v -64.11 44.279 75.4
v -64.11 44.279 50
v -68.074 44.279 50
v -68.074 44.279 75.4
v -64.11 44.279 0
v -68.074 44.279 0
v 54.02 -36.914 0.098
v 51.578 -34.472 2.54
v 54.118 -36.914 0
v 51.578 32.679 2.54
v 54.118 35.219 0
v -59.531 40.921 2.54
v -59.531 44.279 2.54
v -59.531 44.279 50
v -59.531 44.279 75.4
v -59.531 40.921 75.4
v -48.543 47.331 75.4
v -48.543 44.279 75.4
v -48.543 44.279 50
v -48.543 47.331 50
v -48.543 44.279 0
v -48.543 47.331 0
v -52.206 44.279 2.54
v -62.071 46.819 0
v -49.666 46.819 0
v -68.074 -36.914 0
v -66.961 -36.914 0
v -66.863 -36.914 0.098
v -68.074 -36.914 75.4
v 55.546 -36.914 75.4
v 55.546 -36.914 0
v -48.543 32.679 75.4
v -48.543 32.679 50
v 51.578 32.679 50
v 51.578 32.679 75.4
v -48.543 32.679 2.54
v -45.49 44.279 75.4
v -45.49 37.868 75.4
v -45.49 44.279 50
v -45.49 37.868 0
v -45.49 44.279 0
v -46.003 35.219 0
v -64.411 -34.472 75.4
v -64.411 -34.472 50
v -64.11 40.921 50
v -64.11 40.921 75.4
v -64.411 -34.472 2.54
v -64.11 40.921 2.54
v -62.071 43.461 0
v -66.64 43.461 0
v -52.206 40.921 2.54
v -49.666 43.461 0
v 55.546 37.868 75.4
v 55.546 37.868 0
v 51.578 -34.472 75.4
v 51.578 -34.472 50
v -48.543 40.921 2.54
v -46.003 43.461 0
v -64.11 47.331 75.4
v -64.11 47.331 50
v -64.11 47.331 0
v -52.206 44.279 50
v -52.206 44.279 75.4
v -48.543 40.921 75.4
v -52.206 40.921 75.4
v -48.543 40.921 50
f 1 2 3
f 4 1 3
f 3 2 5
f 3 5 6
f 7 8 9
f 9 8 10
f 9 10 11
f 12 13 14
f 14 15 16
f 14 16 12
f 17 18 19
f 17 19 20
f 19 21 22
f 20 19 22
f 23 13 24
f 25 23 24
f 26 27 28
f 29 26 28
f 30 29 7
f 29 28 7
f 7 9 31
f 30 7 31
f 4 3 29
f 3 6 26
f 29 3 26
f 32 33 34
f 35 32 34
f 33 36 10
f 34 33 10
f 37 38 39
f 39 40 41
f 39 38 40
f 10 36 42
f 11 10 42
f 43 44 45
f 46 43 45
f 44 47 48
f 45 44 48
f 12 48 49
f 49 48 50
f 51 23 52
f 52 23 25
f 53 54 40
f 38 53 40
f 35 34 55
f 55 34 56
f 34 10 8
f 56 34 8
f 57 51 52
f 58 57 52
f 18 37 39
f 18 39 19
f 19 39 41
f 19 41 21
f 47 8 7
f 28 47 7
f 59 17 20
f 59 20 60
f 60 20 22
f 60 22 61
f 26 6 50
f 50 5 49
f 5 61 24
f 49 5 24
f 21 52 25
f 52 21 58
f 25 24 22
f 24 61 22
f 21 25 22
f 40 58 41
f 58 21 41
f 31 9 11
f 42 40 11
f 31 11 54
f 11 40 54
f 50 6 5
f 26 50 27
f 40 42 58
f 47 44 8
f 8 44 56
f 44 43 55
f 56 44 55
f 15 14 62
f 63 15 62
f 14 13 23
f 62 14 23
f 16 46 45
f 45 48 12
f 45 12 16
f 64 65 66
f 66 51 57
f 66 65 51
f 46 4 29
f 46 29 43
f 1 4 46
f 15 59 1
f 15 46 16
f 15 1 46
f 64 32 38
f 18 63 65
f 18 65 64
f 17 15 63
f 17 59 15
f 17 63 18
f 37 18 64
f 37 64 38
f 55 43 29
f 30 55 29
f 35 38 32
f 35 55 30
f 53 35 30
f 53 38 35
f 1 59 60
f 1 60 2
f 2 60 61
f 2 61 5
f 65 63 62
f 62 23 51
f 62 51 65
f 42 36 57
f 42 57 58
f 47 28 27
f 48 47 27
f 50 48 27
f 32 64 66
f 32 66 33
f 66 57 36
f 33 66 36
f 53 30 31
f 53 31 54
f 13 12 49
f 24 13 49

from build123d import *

# Parameters (mm, degrees)
F1_DEPTH      = 50
F2_DEPTH      = 25.4
F4_T1_DEPTH   = 7.325630635
F4_T3_DEPTH   = 9.8896528584
F4_T5_DEPTH   = 10.1948919696
F4_T7_DEPTH   = 14.7742944759
F4_T9_DEPTH   = 106.6527421576
F4_T11_DEPTH  = 67.1516433358
F4_T16_DEPTH  = 88.4586156969
F4_T22_DEPTH  = 17.6426691914
F4_T27_DEPTH  = 122.521271835
F4_T33_DEPTH  = 88.4586156969
F4_T38_DEPTH  = 122.521271835
F4_T47_DEPTH  = 88.4586156969
F4_T53_DEPTH  = 11.110594402
F4_T61_DEPTH  = 88.4586156969
F4_T66_DEPTH  = 11.110594402
F4_T74_DEPTH  = 13.8577054245
F4_T79_DEPTH  = 9.8896528584
F4_T87_DEPTH  = 9.8896528584
F4_T92_DEPTH  = 13.8577054245
F4_T100_DEPTH = 14.7742944759
F4_T105_DEPTH = 10.1948919696
F4_T113_DEPTH = 73.6837181253
F4_T118_DEPTH = 106.6527421576
F4_T126_DEPTH = 129.0533466244
F4_T132_DEPTH = 73.6837181253


# Not quite as in the source:
# - a fillet or chamfer that OpenCascade refuses, or shapes differently, is made with other operations: its cross-section is extruded or revolved along the edge and cut away or added
# - a feature of the source that left no trace in its solid (it failed there, or was rolled back) is left out


with BuildPart() as f1:
    # F0 (on Top) → F1 (new body)
    with BuildSketch(Plane.XY):
        Polygon((55.5458813906, -34.4724208117), (55.5458813906, 37.8682129085), (-45.4904846847, 37.8682129085), (-45.4904846847, 44.2790202796), (-48.5428348184, 44.2790202796), (-48.5428348184, 47.331366688), (-64.1098022461, 47.331366688), (-64.1098022461, 44.2790202796), (-68.0741816759, 44.2790202796), (-68.0741816759, 37.8682129085), (-68.0741816759, 32.6792225242), (-68.0741816759, -36.9142964482), (55.5458813906, -36.9142964482), align=None)
        Polygon((-48.5428348184, 32.6792225242), (51.5778325498, 32.6792225242), (51.5778325498, -34.4724208117), (-64.4113644958, -34.4724208117), (-64.1098022461, 40.9214422107), (-59.5312826335, 40.9214422107), (-59.5312826335, 44.2790202796), (-52.2056519985, 44.2790202796), (-52.2056519985, 40.9214422107), (-48.5428348184, 40.9214422107), align=None, mode=Mode.SUBTRACT)
    extrude(amount=F1_DEPTH)

    # F0 (on Top) + F1_face (on face) → F2 (join)
    with BuildSketch(Plane.XY):
        Polygon((55.5458813906, -34.4724208117), (55.5458813906, 37.8682129085), (-45.4904846847, 37.8682129085), (-45.4904846847, 44.2790202796), (-48.5428348184, 44.2790202796), (-48.5428348184, 47.331366688), (-64.1098022461, 47.331366688), (-64.1098022461, 44.2790202796), (-68.0741816759, 44.2790202796), (-68.0741816759, 37.8682129085), (-68.0741816759, 32.6792225242), (-68.0741816759, -36.9142964482), (55.5458813906, -36.9142964482), align=None)
        Polygon((-48.5428348184, 32.6792225242), (51.5778325498, 32.6792225242), (51.5778325498, -34.4724208117), (-64.4113644958, -34.4724208117), (-64.1098022461, 40.9214422107), (-59.5312826335, 40.9214422107), (-59.5312826335, 44.2790202796), (-52.2056519985, 44.2790202796), (-52.2056519985, 40.9214422107), (-48.5428348184, 40.9214422107), align=None, mode=Mode.SUBTRACT)
    with BuildSketch(Plane(origin=(-7.1792836418, 9.1982220042, 50), x_dir=(1, 0, 0), z_dir=(0, 0, 1))):
        Polygon((62.7251650324, -46.1125184524), (62.7251650324, 28.6699909043), (-38.3112010429, 28.6699909043), (-38.3112010429, 35.0807982755), (-41.3635511765, 35.0807982755), (-41.3635511765, 38.1331446838), (-56.9305186042, 38.1331446838), (-56.9305186042, 35.0807982755), (-60.8948980341, 35.0807982755), (-60.8948980341, -46.1125184524), align=None)
        Polygon((-56.9305186042, 31.7232202065), (-52.3519989917, 31.7232202065), (-52.3519989917, 35.0807982755), (-45.0263683567, 35.0807982755), (-45.0263683567, 31.7232202065), (-41.3635511765, 31.7232202065), (-41.3635511765, 23.48100052), (58.7571161917, 23.48100052), (58.7571161917, -43.6706428158), (-57.2320808539, -43.6706428158), align=None, mode=Mode.SUBTRACT)
    extrude(amount=F2_DEPTH)

    # F4: chamfer of 2.54 on 10 edges, made by hand

    # F4_s2 → F4_t1 (cut)
    with BuildSketch(Plane.YZ.offset(-59.5312826335)):
        Polygon((44.2790202796, 2.54), (46.8190202796, 0), (44.2790202796, 0), align=None)
    extrude(amount=F4_T1_DEPTH, mode=Mode.SUBTRACT)

    # F4_s4 → F4_t3 (cut)
    with BuildSketch(Plane.XZ.offset(-44.2790202796)):
        Polygon((-59.5312826335, 2.54), (-62.0712826335, 0), (-59.5312826335, 0), align=None)
        Polygon((-52.2056519985, 2.54), (-49.6656519985, 0), (-52.2056519985, 0), align=None)
    extrude(amount=F4_T3_DEPTH, mode=Mode.SUBTRACT)

    # F4_s6 → F4_t5 (cut)
    with BuildSketch(Plane.YZ.offset(-58.737726788)):
        Polygon((40.9214422107, 2.54), (43.4614422107, 0), (40.9214422107, 0), align=None)
    extrude(amount=F4_T5_DEPTH, mode=Mode.SUBTRACT)

    # F4_s8 → F4_t7 (cut)
    with BuildSketch(Plane.XZ.offset(-40.9214422107)):
        Polygon((-48.5428348184, 2.54), (-46.0028348184, 0), (-48.5428348184, 0), align=None)
    extrude(amount=F4_T7_DEPTH, mode=Mode.SUBTRACT)

    # F4_s10 → F4_t9 (cut)
    with BuildSketch(Plane.YZ.offset(-55.0749096078)):
        Polygon((32.6792225242, 2.54), (35.2192225242, 0), (32.6792225242, 0), align=None)
    extrude(amount=F4_T9_DEPTH, mode=Mode.SUBTRACT)

    # F4_s12 → F4_t11 (cut)
    with BuildSketch(Plane.XZ.offset(-32.6792225242)):
        Polygon((51.5778325498, 2.54), (54.1178325498, 0), (51.5778325498, 0), align=None)
    extrude(amount=F4_T11_DEPTH, mode=Mode.SUBTRACT)


with BuildPart() as f4_tool14:
    # F4_s15 → F4_t16 (new body)
    with BuildSketch(Plane(origin=(-0.1650388622, -41.2615219051, 0), x_dir=(0, 0, 1), z_dir=(0.0039997929, 0.9999920008, 0))):
        Polygon((2.54, -64.2729667124), (0, -66.8129667124), (0, -64.2729667124), align=None)
    extrude(amount=F4_T16_DEPTH)

    split(bisect_by=Plane.XZ.offset(34.4724208117), keep=Keep.BOTTOM)

    split(bisect_by=Plane.XZ.offset(-40.9214422107), keep=Keep.TOP)


with BuildPart() as f1_1:
    add(f1.part)

    # F4_t13: cut F4_tool14
    add(f4_tool14.part, mode=Mode.SUBTRACT)


with BuildPart() as f4_tool20:
    # F4_s21 → F4_t22 (new body)
    with BuildSketch(Plane.YZ.offset(-70.6418770355)):
        Polygon((40.9214422107, 2.54), (43.4614422107, 0), (40.9214422107, 0), align=None)
    extrude(amount=F4_T22_DEPTH)

    split(bisect_by=Plane(origin=(-64.2724525799, 0.2570785554, 0), x_dir=(0, 0, 1), z_dir=(0.9999920008, -0.0039997929, 0)), keep=Keep.TOP)


with BuildPart() as f1_2:
    add(f1_1.part)

    # F4_t19: cut F4_tool20
    add(f4_tool20.part, mode=Mode.SUBTRACT)


with BuildPart() as f4_tool25:
    # F4_s26 → F4_t27 (new body)
    with BuildSketch(Plane.YZ.offset(51.5778325498)):
        Polygon((-34.4724208117, 2.54), (-37.0124208117, 0), (-34.4724208117, 0), align=None)
    extrude(amount=-F4_T27_DEPTH)

    split(bisect_by=Plane(origin=(-64.2724525799, 0.2570785554, 0), x_dir=(0, 0, 1), z_dir=(0.9999920008, -0.0039997929, 0)), keep=Keep.TOP)


with BuildPart() as f1_3:
    add(f1_2.part)

    # F4_t24: cut F4_tool25
    add(f4_tool25.part, mode=Mode.SUBTRACT)


with BuildPart() as f4_tool31:
    # F4_s32 → F4_t33 (new body)
    with BuildSketch(Plane(origin=(-0.1650388622, -41.2615219051, 0), x_dir=(0, 0, 1), z_dir=(0.0039997929, 0.9999920008, 0))):
        Polygon((2.54, -64.2729667124), (0, -66.8129667124), (0, -64.2729667124), align=None)
    extrude(amount=F4_T33_DEPTH)

    split(bisect_by=Plane.XZ.offset(34.4724208117), keep=Keep.TOP)

    split(bisect_by=Plane.XZ.offset(36.9142964482), keep=Keep.BOTTOM)


with BuildPart() as f4_tool36:
    # F4_s37 → F4_t38 (new body)
    with BuildSketch(Plane.YZ.offset(51.5778325498)):
        Polygon((-34.4724208117, 2.54), (-37.0124208117, 0), (-34.4724208117, 0), align=None)
    extrude(amount=-F4_T38_DEPTH)

    split(bisect_by=Plane(origin=(-64.2724525799, 0.2570785554, 0), x_dir=(0, 0, 1), z_dir=(-0.9999920008, 0.0039997929, 0)), keep=Keep.TOP)

    split(bisect_by=Plane.YZ.offset(-68.0741816759), keep=Keep.TOP)

    split(bisect_by=Plane.XZ.offset(36.9142964482), keep=Keep.BOTTOM)


with BuildPart() as f4_tool31_1:
    add(f4_tool31.part)

    # F4_t42: intersect F4_tool36
    add(f4_tool36.part, mode=Mode.INTERSECT)


with BuildPart() as f1_4:
    add(f1_3.part)

    # F4_t29: cut F4_tool31
    add(f4_tool31_1.part, mode=Mode.SUBTRACT)


with BuildPart() as f4_tool45:
    # F4_s46 → F4_t47 (new body)
    with BuildSketch(Plane(origin=(-0.1650388622, -41.2615219051, 0), x_dir=(0, 0, 1), z_dir=(0.0039997929, 0.9999920008, 0))):
        Polygon((2.54, -64.2729667124), (0, -66.8129667124), (0, -64.2729667124), align=None)
    extrude(amount=F4_T47_DEPTH)

    split(bisect_by=Plane.XZ.offset(-40.9214422107), keep=Keep.BOTTOM)

    split(bisect_by=Plane.XZ.offset(-44.2790202796), keep=Keep.TOP)

    split(bisect_by=Plane.YZ.offset(-64.1098022461), keep=Keep.BOTTOM)


with BuildPart() as f4_tool51:
    # F4_s52 → F4_t53 (new body)
    with BuildSketch(Plane.YZ.offset(-70.6418770355)):
        Polygon((40.9214422107, 2.54), (43.4614422107, 0), (40.9214422107, 0), align=None)
    extrude(amount=F4_T53_DEPTH)

    split(bisect_by=Plane(origin=(-64.2724525799, 0.2570785554, 0), x_dir=(0, 0, 1), z_dir=(-0.9999920008, 0.0039997929, 0)), keep=Keep.TOP)

    split(bisect_by=Plane.YZ.offset(-68.0741816759), keep=Keep.TOP)


with BuildPart() as f4_tool45_1:
    add(f4_tool45.part)

    # F4_t56: intersect F4_tool51
    add(f4_tool51.part, mode=Mode.INTERSECT)


with BuildPart() as f1_5:
    add(f1_4.part)

    # F4_t43: cut F4_tool45
    add(f4_tool45_1.part, mode=Mode.SUBTRACT)


with BuildPart() as f4_tool59:
    # F4_s60 → F4_t61 (new body)
    with BuildSketch(Plane(origin=(-0.1650388622, -41.2615219051, 0), x_dir=(0, 0, 1), z_dir=(0.0039997929, 0.9999920008, 0))):
        Polygon((2.54, -64.2729667124), (0, -66.8129667124), (0, -64.2729667124), align=None)
    extrude(amount=F4_T61_DEPTH)

    split(bisect_by=Plane.XZ.offset(-44.2790202796), keep=Keep.TOP)

    split(bisect_by=Plane.YZ.offset(-64.1098022461), keep=Keep.TOP)


with BuildPart() as f4_tool64:
    # F4_s65 → F4_t66 (new body)
    with BuildSketch(Plane.YZ.offset(-70.6418770355)):
        Polygon((40.9214422107, 2.54), (43.4614422107, 0), (40.9214422107, 0), align=None)
    extrude(amount=F4_T66_DEPTH)

    split(bisect_by=Plane(origin=(-64.2724525799, 0.2570785554, 0), x_dir=(0, 0, 1), z_dir=(-0.9999920008, 0.0039997929, 0)), keep=Keep.TOP)

    split(bisect_by=Plane.YZ.offset(-68.0741816759), keep=Keep.TOP)


with BuildPart() as f4_tool59_1:
    add(f4_tool59.part)

    # F4_t69: intersect F4_tool64
    add(f4_tool64.part, mode=Mode.INTERSECT)


with BuildPart() as f1_6:
    add(f1_5.part)

    # F4_t57: cut F4_tool59
    add(f4_tool59_1.part, mode=Mode.SUBTRACT)


with BuildPart() as f4_tool72:
    # F4_s73 → F4_t74 (new body)
    with BuildSketch(Plane.YZ.offset(-66.063357423)):
        Polygon((44.2790202796, 2.54), (46.8190202796, 0), (44.2790202796, 0), align=None)
    extrude(amount=F4_T74_DEPTH)

    split(bisect_by=Plane.YZ.offset(-59.5312826335), keep=Keep.BOTTOM)

    split(bisect_by=Plane.YZ.offset(-64.1098022461), keep=Keep.TOP)


with BuildPart() as f4_tool77:
    # F4_s78 → F4_t79 (new body)
    with BuildSketch(Plane.XZ.offset(-40.9214422107)):
        Polygon((-59.5312826335, 2.54), (-62.0712826335, 0), (-59.5312826335, 0), align=None)
    extrude(amount=-F4_T79_DEPTH)

    split(bisect_by=Plane.XZ.offset(-44.2790202796), keep=Keep.BOTTOM)

    split(bisect_by=Plane.XZ.offset(-47.331366688), keep=Keep.TOP)


with BuildPart() as f4_tool72_1:
    add(f4_tool72.part)

    # F4_t82: intersect F4_tool77
    add(f4_tool77.part, mode=Mode.INTERSECT)


with BuildPart() as f1_7:
    add(f1_6.part)

    # F4_t70: cut F4_tool72
    add(f4_tool72_1.part, mode=Mode.SUBTRACT)


with BuildPart() as f4_tool85:
    # F4_s86 → F4_t87 (new body)
    with BuildSketch(Plane.XZ.offset(-50.8110950691)):
        Polygon((-52.2056519985, 2.54), (-49.6656519985, 0), (-52.2056519985, 0), align=None)
    extrude(amount=F4_T87_DEPTH)

    split(bisect_by=Plane.XZ.offset(-44.2790202796), keep=Keep.BOTTOM)

    split(bisect_by=Plane.XZ.offset(-47.331366688), keep=Keep.TOP)


with BuildPart() as f4_tool90:
    # F4_s91 → F4_t92 (new body)
    with BuildSketch(Plane.YZ.offset(-59.5312826335)):
        Polygon((44.2790202796, 2.54), (46.8190202796, 0), (44.2790202796, 0), align=None)
    extrude(amount=F4_T92_DEPTH)

    split(bisect_by=Plane.YZ.offset(-52.2056519985), keep=Keep.TOP)

    split(bisect_by=Plane.YZ.offset(-48.5428348184), keep=Keep.BOTTOM)


with BuildPart() as f4_tool85_1:
    add(f4_tool85.part)

    # F4_t95: intersect F4_tool90
    add(f4_tool90.part, mode=Mode.INTERSECT)


with BuildPart() as f1_8:
    add(f1_7.part)

    # F4_t83: cut F4_tool85
    add(f4_tool85_1.part, mode=Mode.SUBTRACT)


with BuildPart() as f4_tool98:
    # F4_s99 → F4_t100 (new body)
    with BuildSketch(Plane.XZ.offset(-47.4535170001)):
        Polygon((-48.5428348184, 2.54), (-46.0028348184, 0), (-48.5428348184, 0), align=None)
    extrude(amount=F4_T100_DEPTH)

    split(bisect_by=Plane.XZ.offset(-40.9214422107), keep=Keep.BOTTOM)

    split(bisect_by=Plane.XZ.offset(-44.2790202796), keep=Keep.TOP)


with BuildPart() as f4_tool103:
    # F4_s104 → F4_t105 (new body)
    with BuildSketch(Plane.YZ.offset(-52.2056519985)):
        Polygon((40.9214422107, 2.54), (43.4614422107, 0), (40.9214422107, 0), align=None)
    extrude(amount=F4_T105_DEPTH)

    split(bisect_by=Plane.YZ.offset(-48.5428348184), keep=Keep.TOP)

    split(bisect_by=Plane.YZ.offset(-45.4904846847), keep=Keep.BOTTOM)


with BuildPart() as f4_tool98_1:
    add(f4_tool98.part)

    # F4_t108: intersect F4_tool103
    add(f4_tool103.part, mode=Mode.INTERSECT)


with BuildPart() as f1_9:
    add(f1_8.part)

    # F4_t96: cut F4_tool98
    add(f4_tool98_1.part, mode=Mode.SUBTRACT)


with BuildPart() as f4_tool111:
    # F4_s112 → F4_t113 (new body)
    with BuildSketch(Plane.XZ.offset(-39.2112973136)):
        Polygon((51.5778325498, 2.54), (54.1178325498, 0), (51.5778325498, 0), align=None)
    extrude(amount=F4_T113_DEPTH)

    split(bisect_by=Plane.XZ.offset(-32.6792225242), keep=Keep.BOTTOM)

    split(bisect_by=Plane.XZ.offset(-37.8682129085), keep=Keep.TOP)


with BuildPart() as f4_tool116:
    # F4_s117 → F4_t118 (new body)
    with BuildSketch(Plane.YZ.offset(-48.5428348184)):
        Polygon((32.6792225242, 2.54), (35.2192225242, 0), (32.6792225242, 0), align=None)
    extrude(amount=F4_T118_DEPTH)

    split(bisect_by=Plane.YZ.offset(55.5458813906), keep=Keep.BOTTOM)

    split(bisect_by=Plane.YZ.offset(51.5778325498), keep=Keep.TOP)


with BuildPart() as f4_tool111_1:
    add(f4_tool111.part)

    # F4_t121: intersect F4_tool116
    add(f4_tool116.part, mode=Mode.INTERSECT)


with BuildPart() as f1_10:
    add(f1_9.part)

    # F4_t109: cut F4_tool111
    add(f4_tool111_1.part, mode=Mode.SUBTRACT)


with BuildPart() as f4_tool124:
    # F4_s125 → F4_t126 (new body)
    with BuildSketch(Plane.YZ.offset(58.1099073392)):
        Polygon((-34.4724208117, 2.54), (-37.0124208117, 0), (-34.4724208117, 0), align=None)
    extrude(amount=-F4_T126_DEPTH)

    split(bisect_by=Plane.YZ.offset(55.5458813906), keep=Keep.BOTTOM)

    split(bisect_by=Plane.YZ.offset(51.5778325498), keep=Keep.TOP)

    split(bisect_by=Plane.XZ.offset(36.9142964482), keep=Keep.BOTTOM)


with BuildPart() as f4_tool130:
    # F4_s131 → F4_t132 (new body)
    with BuildSketch(Plane.XZ.offset(-32.6792225242)):
        Polygon((51.5778325498, 2.54), (54.1178325498, 0), (51.5778325498, 0), align=None)
    extrude(amount=F4_T132_DEPTH)

    split(bisect_by=Plane.XZ.offset(34.4724208117), keep=Keep.TOP)

    split(bisect_by=Plane.XZ.offset(36.9142964482), keep=Keep.BOTTOM)


with BuildPart() as f4_tool124_1:
    add(f4_tool124.part)

    # F4_t135: intersect F4_tool130
    add(f4_tool130.part, mode=Mode.INTERSECT)


with BuildPart() as f1_11:
    add(f1_10.part)

    # F4_t122: cut F4_tool124
    add(f4_tool124_1.part, mode=Mode.SUBTRACT)


solid = f1_11.part
